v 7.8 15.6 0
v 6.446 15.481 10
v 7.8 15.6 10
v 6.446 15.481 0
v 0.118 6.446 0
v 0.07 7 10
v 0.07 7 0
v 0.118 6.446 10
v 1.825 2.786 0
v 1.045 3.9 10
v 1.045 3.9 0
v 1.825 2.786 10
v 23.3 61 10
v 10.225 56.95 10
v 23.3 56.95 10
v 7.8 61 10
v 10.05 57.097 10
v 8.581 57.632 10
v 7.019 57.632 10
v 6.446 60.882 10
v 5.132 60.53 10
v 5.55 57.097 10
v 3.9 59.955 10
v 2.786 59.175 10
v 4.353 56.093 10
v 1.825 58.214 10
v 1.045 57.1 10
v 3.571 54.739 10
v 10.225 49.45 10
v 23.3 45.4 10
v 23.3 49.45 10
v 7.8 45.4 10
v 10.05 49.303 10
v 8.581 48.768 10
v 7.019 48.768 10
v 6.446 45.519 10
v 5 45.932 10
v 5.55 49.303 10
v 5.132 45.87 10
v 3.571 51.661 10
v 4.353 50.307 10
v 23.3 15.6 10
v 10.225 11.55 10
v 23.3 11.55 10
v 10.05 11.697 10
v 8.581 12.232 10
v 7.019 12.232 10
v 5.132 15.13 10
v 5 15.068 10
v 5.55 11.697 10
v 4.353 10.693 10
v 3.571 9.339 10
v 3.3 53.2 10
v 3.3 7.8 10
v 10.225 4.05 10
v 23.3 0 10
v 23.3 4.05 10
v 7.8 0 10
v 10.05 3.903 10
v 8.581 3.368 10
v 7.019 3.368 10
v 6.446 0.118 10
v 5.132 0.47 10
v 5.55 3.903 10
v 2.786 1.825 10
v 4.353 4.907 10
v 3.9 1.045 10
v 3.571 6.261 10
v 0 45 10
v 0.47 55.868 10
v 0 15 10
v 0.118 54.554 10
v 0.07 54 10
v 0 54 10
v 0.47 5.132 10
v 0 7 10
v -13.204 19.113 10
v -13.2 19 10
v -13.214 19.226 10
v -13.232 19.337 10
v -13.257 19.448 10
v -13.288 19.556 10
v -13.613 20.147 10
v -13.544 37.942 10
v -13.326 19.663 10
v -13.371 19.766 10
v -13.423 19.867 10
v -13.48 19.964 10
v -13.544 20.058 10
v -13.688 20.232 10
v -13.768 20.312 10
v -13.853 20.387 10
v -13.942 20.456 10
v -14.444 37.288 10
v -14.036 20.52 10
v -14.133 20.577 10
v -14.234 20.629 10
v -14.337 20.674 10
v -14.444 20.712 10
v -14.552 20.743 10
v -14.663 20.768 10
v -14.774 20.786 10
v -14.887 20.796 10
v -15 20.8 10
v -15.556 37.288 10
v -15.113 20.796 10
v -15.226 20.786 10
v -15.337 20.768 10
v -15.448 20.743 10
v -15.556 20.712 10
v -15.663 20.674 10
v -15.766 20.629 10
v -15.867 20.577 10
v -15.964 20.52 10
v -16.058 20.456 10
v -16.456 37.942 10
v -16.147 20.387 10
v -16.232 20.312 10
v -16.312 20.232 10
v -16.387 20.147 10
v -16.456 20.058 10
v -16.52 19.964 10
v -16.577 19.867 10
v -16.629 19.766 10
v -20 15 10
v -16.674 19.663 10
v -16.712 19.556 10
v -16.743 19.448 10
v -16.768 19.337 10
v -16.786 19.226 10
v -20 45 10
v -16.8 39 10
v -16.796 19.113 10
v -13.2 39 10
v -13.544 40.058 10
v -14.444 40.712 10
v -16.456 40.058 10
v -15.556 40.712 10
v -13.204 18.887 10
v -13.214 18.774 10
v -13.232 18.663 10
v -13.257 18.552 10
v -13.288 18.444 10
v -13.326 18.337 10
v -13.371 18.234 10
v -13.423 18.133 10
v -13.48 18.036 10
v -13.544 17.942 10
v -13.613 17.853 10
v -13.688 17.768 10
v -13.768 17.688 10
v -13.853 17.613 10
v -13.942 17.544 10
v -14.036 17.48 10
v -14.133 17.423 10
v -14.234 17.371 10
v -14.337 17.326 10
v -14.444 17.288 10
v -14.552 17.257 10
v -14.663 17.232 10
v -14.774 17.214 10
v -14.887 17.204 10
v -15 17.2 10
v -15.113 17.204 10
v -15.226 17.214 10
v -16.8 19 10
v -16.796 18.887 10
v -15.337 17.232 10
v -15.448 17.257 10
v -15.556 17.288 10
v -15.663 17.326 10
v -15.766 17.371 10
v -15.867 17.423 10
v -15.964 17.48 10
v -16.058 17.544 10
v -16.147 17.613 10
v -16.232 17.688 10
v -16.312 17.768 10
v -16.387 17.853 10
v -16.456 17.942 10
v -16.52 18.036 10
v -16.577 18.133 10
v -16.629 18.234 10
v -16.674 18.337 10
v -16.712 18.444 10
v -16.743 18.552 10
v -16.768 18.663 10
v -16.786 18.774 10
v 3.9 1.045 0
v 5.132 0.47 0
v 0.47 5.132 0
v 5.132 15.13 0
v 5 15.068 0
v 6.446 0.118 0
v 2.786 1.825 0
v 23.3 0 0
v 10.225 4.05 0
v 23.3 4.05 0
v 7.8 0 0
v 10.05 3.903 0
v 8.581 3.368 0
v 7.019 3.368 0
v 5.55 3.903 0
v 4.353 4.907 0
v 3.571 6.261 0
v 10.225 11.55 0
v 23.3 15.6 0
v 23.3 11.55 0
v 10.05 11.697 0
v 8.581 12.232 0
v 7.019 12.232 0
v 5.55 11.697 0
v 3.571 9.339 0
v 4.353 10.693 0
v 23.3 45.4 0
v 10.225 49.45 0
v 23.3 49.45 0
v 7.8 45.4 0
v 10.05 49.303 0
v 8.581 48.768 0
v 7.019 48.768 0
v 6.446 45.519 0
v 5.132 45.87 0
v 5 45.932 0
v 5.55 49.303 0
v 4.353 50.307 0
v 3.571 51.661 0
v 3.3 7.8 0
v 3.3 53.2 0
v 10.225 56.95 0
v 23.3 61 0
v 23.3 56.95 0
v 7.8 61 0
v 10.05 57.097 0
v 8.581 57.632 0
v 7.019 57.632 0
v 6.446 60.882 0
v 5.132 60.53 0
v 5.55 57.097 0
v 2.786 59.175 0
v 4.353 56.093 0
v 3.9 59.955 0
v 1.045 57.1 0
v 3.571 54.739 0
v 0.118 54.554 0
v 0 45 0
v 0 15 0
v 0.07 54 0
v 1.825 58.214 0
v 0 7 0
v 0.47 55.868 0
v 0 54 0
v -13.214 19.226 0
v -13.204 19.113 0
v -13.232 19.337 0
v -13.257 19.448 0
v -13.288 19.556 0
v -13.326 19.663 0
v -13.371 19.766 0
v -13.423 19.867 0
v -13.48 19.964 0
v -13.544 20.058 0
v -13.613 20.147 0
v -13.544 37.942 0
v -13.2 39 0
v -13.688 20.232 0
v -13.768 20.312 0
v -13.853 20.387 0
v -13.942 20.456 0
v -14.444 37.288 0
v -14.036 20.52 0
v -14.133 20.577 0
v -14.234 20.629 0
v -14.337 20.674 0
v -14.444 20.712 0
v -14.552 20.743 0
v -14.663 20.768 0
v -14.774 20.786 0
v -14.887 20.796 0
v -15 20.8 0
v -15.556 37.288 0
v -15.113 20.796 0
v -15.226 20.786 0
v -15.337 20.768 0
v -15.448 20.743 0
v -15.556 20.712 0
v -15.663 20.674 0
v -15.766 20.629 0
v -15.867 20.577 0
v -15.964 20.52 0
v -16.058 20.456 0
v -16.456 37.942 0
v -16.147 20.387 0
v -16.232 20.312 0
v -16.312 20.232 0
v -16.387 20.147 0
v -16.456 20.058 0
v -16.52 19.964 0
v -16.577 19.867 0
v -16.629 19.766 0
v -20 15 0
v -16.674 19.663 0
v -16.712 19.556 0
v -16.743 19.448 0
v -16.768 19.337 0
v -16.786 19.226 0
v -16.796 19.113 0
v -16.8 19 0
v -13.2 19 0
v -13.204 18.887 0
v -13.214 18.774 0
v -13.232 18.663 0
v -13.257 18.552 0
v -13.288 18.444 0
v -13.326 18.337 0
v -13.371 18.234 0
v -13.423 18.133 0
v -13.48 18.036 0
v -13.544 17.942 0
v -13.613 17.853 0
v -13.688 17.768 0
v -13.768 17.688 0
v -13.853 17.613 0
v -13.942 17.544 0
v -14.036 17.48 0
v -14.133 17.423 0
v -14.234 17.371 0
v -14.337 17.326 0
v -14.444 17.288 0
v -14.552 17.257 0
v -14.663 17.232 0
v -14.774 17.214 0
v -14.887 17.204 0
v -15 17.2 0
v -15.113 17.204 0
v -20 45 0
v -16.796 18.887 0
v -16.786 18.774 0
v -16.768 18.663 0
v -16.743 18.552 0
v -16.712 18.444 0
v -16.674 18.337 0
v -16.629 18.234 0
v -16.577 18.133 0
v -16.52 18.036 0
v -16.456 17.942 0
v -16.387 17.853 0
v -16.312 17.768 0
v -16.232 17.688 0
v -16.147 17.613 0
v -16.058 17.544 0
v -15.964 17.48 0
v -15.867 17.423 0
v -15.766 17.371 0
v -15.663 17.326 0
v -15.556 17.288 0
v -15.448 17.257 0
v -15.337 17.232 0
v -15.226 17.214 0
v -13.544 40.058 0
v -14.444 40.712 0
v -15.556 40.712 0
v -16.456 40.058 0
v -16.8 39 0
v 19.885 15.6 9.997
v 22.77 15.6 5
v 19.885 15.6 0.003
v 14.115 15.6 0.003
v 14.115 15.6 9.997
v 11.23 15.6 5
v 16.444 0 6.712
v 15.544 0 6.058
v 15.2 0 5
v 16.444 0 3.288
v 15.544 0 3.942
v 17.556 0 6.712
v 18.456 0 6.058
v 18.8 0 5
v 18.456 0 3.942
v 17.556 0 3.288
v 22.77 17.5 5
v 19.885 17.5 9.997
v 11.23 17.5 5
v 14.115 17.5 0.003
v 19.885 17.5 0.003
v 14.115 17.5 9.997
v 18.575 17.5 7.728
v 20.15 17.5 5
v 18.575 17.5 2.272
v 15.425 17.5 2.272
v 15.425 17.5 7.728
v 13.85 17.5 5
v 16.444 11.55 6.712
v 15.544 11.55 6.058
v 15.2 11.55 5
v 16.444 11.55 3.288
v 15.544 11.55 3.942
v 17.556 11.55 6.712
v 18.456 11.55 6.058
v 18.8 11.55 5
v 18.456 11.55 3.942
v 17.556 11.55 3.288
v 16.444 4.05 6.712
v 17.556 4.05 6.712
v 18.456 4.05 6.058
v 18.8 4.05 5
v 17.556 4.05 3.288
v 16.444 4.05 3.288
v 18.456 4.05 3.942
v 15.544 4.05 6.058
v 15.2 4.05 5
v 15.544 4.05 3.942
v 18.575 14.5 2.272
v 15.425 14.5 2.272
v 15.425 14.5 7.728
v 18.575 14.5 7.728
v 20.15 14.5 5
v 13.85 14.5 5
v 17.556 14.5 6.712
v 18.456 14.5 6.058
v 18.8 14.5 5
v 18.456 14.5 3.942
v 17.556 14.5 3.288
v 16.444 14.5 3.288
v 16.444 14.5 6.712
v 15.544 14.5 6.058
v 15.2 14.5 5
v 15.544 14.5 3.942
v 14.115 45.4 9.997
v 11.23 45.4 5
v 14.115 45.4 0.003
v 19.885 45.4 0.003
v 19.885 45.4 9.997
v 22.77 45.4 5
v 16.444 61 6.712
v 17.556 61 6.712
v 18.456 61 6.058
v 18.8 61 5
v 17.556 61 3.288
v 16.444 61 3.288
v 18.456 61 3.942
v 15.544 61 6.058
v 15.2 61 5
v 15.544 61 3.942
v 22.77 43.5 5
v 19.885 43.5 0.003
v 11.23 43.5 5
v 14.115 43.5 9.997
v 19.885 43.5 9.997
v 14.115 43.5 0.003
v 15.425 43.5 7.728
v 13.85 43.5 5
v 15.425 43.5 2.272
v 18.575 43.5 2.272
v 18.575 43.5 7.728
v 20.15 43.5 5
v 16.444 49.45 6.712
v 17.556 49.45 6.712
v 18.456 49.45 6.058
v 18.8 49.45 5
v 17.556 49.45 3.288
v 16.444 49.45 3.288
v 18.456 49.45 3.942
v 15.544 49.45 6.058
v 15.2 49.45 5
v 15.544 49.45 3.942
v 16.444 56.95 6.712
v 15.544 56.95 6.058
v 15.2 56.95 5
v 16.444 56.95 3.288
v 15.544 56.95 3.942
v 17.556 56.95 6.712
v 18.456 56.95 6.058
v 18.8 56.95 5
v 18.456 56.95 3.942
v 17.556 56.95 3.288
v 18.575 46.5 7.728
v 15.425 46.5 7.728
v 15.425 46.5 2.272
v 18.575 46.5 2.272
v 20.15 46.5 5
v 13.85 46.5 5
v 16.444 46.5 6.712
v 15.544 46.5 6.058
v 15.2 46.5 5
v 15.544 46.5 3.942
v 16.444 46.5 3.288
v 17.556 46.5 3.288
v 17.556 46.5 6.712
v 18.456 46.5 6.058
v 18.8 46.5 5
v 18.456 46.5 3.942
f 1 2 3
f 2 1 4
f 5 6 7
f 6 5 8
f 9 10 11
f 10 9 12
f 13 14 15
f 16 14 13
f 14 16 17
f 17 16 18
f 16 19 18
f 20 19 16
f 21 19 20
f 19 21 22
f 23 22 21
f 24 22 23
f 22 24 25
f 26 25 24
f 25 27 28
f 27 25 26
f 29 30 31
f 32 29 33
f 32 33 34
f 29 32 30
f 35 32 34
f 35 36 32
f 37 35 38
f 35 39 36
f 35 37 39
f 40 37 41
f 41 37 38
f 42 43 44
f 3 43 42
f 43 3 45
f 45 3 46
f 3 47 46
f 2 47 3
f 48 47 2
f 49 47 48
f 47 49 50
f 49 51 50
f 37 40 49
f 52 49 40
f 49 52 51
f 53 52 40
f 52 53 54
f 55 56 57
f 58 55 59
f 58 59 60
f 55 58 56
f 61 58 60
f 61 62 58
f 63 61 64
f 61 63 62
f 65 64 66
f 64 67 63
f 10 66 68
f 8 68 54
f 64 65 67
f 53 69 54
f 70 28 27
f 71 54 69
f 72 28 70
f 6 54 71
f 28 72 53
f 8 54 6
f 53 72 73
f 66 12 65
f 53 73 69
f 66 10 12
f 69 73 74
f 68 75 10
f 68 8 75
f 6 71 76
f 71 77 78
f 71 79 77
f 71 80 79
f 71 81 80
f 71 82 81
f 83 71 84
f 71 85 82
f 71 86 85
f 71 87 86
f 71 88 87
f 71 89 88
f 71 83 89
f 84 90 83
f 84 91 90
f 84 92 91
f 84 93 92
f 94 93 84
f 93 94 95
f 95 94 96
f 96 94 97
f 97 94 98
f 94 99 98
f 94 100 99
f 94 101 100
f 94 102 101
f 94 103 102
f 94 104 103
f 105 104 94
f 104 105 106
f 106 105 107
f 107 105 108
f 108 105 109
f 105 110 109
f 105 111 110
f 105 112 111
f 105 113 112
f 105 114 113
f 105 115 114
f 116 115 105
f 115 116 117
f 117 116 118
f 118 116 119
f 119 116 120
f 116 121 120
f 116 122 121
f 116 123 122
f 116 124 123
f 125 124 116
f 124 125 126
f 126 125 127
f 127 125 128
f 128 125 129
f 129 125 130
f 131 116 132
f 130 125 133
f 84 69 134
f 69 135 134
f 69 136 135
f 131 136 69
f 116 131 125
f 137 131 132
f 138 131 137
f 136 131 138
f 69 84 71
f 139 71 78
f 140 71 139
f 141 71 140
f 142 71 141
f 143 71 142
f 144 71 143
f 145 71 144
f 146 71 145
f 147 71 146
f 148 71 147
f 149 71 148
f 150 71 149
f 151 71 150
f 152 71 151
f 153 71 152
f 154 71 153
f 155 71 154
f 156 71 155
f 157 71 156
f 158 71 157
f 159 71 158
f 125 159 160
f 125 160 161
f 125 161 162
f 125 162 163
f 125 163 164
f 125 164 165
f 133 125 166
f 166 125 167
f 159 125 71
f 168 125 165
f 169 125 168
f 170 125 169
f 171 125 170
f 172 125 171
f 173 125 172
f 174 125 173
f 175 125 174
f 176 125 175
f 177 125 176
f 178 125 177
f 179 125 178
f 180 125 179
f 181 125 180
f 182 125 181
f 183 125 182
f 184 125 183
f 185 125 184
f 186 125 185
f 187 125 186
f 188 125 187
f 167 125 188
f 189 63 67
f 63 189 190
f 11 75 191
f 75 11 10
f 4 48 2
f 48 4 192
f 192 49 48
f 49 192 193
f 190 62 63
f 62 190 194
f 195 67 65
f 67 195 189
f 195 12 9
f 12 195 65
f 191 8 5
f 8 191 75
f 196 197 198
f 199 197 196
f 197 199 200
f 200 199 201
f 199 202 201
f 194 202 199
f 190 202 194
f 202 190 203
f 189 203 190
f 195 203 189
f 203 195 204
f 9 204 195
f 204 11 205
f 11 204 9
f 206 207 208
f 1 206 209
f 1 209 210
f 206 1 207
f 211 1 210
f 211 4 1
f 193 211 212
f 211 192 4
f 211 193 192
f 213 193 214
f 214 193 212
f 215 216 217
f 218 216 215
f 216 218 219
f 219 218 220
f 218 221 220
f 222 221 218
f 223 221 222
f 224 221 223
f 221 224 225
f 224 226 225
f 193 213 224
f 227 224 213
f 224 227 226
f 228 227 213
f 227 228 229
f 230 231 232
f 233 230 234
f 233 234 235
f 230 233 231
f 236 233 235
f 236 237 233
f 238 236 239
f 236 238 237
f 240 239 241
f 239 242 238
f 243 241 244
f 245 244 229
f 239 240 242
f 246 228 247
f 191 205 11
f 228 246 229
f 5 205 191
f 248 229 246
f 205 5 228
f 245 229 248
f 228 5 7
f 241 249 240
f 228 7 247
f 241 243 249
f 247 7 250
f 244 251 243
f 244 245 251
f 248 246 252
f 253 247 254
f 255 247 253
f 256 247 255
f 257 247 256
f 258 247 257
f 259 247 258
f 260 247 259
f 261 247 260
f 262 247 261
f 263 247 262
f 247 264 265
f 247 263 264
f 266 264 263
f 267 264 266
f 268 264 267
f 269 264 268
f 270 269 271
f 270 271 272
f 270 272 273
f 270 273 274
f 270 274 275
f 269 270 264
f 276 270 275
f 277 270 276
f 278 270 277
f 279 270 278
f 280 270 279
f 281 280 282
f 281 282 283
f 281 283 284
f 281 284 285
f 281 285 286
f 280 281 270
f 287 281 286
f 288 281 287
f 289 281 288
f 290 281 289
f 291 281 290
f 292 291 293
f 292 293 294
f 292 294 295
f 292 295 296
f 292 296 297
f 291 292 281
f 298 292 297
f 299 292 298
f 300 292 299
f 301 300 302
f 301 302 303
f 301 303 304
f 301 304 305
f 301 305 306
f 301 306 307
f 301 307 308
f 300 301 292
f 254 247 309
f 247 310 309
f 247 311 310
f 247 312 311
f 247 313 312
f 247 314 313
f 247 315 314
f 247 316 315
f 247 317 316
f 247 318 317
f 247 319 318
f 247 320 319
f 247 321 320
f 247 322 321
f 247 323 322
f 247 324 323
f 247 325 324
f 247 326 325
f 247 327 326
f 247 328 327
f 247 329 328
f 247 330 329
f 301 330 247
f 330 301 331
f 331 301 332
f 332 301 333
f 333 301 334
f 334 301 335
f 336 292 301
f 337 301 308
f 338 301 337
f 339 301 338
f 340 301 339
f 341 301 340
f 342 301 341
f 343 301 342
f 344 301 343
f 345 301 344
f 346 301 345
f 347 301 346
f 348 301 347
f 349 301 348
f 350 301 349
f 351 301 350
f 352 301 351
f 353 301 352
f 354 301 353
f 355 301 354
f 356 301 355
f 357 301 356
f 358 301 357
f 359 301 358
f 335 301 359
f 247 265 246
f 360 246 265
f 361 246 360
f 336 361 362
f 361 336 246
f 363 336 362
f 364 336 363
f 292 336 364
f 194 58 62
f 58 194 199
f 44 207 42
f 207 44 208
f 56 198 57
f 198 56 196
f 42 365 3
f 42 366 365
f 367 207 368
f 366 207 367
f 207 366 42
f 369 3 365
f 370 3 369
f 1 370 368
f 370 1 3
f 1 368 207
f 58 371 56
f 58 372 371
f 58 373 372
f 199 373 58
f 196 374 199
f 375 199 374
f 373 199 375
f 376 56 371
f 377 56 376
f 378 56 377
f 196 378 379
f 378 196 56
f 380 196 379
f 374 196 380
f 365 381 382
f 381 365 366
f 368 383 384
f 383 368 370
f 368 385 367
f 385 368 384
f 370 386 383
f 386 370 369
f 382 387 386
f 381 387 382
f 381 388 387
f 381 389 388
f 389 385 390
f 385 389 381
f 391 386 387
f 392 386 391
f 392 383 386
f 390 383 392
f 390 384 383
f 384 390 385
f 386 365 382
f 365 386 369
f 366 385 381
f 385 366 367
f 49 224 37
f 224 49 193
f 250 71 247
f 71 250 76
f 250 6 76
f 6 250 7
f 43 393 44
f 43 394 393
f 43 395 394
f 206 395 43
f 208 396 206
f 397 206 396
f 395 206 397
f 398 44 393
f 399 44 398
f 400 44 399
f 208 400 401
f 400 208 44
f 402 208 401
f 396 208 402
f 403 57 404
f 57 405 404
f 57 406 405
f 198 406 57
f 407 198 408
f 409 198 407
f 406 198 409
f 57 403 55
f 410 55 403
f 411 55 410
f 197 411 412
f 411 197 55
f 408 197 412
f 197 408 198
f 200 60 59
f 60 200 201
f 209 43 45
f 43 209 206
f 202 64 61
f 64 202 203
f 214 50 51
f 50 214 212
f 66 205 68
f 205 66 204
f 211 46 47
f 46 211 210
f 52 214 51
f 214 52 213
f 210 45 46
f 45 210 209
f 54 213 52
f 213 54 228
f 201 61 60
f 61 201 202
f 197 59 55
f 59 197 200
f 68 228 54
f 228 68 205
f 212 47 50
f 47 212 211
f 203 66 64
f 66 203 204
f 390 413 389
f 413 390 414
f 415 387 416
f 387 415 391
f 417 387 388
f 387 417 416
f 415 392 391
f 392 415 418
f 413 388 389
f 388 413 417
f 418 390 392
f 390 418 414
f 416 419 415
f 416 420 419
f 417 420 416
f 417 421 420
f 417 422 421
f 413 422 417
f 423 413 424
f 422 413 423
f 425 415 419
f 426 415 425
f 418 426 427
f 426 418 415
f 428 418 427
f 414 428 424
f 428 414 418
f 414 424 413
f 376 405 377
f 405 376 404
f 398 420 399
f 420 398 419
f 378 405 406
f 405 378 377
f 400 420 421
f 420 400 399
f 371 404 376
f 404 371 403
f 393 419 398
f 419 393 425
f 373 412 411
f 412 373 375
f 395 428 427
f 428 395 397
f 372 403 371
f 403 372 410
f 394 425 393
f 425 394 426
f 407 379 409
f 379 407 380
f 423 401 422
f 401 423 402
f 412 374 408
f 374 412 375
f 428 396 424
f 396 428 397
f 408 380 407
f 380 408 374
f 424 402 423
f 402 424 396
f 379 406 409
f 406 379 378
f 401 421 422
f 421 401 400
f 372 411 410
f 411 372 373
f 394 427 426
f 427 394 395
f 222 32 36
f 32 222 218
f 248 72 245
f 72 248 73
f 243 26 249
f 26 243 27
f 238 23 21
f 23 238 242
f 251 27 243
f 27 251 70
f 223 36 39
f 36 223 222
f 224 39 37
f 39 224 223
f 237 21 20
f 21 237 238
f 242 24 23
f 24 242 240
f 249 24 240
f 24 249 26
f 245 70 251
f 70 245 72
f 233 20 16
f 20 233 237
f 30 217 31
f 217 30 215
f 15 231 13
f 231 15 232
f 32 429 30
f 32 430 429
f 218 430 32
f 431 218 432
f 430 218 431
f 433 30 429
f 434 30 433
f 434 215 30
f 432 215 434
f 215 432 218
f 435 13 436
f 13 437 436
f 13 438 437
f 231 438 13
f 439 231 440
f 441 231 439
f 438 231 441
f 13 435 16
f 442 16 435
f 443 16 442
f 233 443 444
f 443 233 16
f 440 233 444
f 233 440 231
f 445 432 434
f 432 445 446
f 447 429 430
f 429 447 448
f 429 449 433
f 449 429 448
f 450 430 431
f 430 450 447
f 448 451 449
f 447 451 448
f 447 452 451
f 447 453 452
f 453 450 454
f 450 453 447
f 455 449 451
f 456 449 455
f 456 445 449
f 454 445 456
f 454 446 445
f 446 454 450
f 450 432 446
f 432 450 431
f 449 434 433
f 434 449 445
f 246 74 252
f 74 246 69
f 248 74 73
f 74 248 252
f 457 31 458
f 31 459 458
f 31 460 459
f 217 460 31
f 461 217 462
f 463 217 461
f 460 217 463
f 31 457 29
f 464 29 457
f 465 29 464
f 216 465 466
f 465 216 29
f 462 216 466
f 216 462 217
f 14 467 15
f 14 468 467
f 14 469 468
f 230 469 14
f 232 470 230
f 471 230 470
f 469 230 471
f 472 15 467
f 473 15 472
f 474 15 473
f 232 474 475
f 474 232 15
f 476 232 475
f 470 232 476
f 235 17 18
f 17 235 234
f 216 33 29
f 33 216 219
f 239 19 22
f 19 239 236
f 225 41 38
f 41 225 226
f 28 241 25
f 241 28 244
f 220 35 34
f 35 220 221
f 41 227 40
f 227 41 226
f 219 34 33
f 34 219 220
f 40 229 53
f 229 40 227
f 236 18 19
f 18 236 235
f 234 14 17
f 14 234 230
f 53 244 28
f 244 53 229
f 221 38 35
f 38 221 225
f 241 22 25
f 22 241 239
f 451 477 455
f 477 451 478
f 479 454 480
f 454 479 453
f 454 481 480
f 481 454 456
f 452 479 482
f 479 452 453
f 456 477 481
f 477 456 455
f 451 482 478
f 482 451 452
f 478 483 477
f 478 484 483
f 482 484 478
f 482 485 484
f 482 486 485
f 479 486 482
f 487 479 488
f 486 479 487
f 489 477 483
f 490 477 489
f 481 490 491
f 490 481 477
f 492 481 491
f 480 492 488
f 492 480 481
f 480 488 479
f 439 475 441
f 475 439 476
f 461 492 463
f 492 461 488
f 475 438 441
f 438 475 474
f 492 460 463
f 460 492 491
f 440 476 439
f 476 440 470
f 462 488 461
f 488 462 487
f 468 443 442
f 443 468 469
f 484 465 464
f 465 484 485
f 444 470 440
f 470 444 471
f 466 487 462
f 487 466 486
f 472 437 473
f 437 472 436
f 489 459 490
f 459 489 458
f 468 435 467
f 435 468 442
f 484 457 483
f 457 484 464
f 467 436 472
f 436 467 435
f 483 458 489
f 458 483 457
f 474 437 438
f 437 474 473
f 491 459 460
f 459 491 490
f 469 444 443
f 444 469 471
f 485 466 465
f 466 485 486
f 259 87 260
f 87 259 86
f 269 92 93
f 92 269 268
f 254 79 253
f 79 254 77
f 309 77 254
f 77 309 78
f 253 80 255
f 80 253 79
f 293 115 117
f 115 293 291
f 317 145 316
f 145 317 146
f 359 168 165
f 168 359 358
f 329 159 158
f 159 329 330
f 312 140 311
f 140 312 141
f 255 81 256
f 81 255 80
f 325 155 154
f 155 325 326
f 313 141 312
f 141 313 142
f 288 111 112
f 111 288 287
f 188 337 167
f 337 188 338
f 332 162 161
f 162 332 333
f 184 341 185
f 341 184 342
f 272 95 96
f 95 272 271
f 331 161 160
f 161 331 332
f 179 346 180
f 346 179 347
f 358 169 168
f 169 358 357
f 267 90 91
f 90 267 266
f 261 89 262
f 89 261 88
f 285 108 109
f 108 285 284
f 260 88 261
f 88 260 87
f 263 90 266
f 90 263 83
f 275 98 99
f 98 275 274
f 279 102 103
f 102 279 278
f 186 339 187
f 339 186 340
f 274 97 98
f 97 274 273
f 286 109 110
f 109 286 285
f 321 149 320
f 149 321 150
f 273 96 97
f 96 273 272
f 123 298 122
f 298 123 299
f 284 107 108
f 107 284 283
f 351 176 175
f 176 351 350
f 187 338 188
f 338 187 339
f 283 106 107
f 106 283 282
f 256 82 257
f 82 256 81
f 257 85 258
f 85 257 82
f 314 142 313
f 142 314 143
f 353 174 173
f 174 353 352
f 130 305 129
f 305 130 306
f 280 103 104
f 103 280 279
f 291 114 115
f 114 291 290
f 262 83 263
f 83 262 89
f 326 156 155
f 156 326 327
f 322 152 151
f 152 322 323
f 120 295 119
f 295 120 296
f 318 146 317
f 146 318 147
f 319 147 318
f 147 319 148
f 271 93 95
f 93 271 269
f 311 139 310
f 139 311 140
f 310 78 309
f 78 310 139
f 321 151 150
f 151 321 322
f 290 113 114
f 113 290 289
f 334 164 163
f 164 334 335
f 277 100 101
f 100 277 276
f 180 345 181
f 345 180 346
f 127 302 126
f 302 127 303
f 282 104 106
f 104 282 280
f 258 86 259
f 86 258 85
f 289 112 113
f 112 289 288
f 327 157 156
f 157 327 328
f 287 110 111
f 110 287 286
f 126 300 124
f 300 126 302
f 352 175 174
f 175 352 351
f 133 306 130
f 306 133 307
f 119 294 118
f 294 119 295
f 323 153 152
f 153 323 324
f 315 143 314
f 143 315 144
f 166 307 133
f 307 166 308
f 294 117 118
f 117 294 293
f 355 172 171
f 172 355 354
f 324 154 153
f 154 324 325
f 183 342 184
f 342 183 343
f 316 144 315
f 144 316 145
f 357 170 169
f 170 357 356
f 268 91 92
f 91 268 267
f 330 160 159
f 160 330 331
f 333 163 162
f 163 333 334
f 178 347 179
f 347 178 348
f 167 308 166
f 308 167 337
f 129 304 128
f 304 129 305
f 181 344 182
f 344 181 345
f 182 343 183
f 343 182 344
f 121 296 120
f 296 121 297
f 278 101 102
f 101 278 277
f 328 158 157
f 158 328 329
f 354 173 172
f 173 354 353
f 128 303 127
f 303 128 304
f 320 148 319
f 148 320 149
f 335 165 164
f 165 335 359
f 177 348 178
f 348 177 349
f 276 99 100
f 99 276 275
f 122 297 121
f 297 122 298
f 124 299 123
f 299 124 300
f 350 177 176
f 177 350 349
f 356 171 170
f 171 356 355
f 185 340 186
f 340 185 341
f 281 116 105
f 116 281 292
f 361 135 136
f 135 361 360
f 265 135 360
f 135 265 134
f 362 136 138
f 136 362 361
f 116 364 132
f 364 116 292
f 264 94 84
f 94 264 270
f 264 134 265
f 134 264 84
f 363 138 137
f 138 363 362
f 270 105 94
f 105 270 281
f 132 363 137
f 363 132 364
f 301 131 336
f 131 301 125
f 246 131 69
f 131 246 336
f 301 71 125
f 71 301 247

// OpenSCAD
// PRUSA Mendel  
// X-Endstop holder
// Used to attach endstop to 8mm X-rods
// GNU GPL v3
// Josef Průša
// josefprusa@me.com
// prusadjs.cz
// modified version creation Coen Roos 14 dec. 2012
// modified version creation Robert Moro 16 dec. 2012


/**
 * @id X-endstop-holder
 * @name X-Endstop holder
 * @category Printed
 * @using 1 m3x20xhex
 * @using 1 m3nut
 * @using 2 m3washer
 */

m3_nut_diameter_horizontal = 6.3;
m8_diameter=9;
m3_diameter=3.6;
outer_diameter = m8_diameter/2+3.3;
opening_size = m8_diameter-1.5; //openingsize
module endstop()
{
	// Rodclamp
	rodclamp(0);

	// Rodclamp
 	rotate(a=180, v=[1,0,0]) translate([0,-61,-10]) rodclamp(1);

	// Bridge between rodclamps
	translate([0,15,0])
	{
		difference()
		{
			translate([-20,0,0]) {
			cube([25,30,10]);
			}
			// Holes for endstop switch
			union()
			{
				translate([-15,4,0])
				{
					cylinder(h =120, r = m3_diameter/2, $fn = 100);
					translate([0,20,0])cylinder(h =12, r = m3_diameter/2, $fn = 10);
				}
			}
			
		}
	}

}

module rodclamp(switch)
{
 	difference()
	{
		union()
		{
			translate([outer_diameter, outer_diameter, 0]) cylinder(h =10, r = outer_diameter, $fn = 36);
			translate([outer_diameter, 0, 0]) cube([15.5,outer_diameter*2,10]);
			translate([17, 17.5, 5]) rotate([90, 0, 0]) cylinder(h =5, r = 5.77, $fn = 6);
			translate ([0,7,0]) cube([5,10,10]);
		}
		translate([9, outer_diameter-opening_size/2, -1]) cube([18,opening_size,20]);
		translate([outer_diameter, outer_diameter, -1]) cylinder(h =20, r = m8_diameter/2, $fn = 18);
		translate([17, 19.5, 5]) rotate([90, 0, 0]) cylinder(h =5, r = m3_nut_diameter_horizontal/2, $fn = 6);
		//Securing hole
		translate([17, 17, 5]) rotate([90, 0, 0]) cylinder(h =20, r = m3_diameter/2, $fn = 10);
	   }
}

endstop();

//rodclamp(0);
